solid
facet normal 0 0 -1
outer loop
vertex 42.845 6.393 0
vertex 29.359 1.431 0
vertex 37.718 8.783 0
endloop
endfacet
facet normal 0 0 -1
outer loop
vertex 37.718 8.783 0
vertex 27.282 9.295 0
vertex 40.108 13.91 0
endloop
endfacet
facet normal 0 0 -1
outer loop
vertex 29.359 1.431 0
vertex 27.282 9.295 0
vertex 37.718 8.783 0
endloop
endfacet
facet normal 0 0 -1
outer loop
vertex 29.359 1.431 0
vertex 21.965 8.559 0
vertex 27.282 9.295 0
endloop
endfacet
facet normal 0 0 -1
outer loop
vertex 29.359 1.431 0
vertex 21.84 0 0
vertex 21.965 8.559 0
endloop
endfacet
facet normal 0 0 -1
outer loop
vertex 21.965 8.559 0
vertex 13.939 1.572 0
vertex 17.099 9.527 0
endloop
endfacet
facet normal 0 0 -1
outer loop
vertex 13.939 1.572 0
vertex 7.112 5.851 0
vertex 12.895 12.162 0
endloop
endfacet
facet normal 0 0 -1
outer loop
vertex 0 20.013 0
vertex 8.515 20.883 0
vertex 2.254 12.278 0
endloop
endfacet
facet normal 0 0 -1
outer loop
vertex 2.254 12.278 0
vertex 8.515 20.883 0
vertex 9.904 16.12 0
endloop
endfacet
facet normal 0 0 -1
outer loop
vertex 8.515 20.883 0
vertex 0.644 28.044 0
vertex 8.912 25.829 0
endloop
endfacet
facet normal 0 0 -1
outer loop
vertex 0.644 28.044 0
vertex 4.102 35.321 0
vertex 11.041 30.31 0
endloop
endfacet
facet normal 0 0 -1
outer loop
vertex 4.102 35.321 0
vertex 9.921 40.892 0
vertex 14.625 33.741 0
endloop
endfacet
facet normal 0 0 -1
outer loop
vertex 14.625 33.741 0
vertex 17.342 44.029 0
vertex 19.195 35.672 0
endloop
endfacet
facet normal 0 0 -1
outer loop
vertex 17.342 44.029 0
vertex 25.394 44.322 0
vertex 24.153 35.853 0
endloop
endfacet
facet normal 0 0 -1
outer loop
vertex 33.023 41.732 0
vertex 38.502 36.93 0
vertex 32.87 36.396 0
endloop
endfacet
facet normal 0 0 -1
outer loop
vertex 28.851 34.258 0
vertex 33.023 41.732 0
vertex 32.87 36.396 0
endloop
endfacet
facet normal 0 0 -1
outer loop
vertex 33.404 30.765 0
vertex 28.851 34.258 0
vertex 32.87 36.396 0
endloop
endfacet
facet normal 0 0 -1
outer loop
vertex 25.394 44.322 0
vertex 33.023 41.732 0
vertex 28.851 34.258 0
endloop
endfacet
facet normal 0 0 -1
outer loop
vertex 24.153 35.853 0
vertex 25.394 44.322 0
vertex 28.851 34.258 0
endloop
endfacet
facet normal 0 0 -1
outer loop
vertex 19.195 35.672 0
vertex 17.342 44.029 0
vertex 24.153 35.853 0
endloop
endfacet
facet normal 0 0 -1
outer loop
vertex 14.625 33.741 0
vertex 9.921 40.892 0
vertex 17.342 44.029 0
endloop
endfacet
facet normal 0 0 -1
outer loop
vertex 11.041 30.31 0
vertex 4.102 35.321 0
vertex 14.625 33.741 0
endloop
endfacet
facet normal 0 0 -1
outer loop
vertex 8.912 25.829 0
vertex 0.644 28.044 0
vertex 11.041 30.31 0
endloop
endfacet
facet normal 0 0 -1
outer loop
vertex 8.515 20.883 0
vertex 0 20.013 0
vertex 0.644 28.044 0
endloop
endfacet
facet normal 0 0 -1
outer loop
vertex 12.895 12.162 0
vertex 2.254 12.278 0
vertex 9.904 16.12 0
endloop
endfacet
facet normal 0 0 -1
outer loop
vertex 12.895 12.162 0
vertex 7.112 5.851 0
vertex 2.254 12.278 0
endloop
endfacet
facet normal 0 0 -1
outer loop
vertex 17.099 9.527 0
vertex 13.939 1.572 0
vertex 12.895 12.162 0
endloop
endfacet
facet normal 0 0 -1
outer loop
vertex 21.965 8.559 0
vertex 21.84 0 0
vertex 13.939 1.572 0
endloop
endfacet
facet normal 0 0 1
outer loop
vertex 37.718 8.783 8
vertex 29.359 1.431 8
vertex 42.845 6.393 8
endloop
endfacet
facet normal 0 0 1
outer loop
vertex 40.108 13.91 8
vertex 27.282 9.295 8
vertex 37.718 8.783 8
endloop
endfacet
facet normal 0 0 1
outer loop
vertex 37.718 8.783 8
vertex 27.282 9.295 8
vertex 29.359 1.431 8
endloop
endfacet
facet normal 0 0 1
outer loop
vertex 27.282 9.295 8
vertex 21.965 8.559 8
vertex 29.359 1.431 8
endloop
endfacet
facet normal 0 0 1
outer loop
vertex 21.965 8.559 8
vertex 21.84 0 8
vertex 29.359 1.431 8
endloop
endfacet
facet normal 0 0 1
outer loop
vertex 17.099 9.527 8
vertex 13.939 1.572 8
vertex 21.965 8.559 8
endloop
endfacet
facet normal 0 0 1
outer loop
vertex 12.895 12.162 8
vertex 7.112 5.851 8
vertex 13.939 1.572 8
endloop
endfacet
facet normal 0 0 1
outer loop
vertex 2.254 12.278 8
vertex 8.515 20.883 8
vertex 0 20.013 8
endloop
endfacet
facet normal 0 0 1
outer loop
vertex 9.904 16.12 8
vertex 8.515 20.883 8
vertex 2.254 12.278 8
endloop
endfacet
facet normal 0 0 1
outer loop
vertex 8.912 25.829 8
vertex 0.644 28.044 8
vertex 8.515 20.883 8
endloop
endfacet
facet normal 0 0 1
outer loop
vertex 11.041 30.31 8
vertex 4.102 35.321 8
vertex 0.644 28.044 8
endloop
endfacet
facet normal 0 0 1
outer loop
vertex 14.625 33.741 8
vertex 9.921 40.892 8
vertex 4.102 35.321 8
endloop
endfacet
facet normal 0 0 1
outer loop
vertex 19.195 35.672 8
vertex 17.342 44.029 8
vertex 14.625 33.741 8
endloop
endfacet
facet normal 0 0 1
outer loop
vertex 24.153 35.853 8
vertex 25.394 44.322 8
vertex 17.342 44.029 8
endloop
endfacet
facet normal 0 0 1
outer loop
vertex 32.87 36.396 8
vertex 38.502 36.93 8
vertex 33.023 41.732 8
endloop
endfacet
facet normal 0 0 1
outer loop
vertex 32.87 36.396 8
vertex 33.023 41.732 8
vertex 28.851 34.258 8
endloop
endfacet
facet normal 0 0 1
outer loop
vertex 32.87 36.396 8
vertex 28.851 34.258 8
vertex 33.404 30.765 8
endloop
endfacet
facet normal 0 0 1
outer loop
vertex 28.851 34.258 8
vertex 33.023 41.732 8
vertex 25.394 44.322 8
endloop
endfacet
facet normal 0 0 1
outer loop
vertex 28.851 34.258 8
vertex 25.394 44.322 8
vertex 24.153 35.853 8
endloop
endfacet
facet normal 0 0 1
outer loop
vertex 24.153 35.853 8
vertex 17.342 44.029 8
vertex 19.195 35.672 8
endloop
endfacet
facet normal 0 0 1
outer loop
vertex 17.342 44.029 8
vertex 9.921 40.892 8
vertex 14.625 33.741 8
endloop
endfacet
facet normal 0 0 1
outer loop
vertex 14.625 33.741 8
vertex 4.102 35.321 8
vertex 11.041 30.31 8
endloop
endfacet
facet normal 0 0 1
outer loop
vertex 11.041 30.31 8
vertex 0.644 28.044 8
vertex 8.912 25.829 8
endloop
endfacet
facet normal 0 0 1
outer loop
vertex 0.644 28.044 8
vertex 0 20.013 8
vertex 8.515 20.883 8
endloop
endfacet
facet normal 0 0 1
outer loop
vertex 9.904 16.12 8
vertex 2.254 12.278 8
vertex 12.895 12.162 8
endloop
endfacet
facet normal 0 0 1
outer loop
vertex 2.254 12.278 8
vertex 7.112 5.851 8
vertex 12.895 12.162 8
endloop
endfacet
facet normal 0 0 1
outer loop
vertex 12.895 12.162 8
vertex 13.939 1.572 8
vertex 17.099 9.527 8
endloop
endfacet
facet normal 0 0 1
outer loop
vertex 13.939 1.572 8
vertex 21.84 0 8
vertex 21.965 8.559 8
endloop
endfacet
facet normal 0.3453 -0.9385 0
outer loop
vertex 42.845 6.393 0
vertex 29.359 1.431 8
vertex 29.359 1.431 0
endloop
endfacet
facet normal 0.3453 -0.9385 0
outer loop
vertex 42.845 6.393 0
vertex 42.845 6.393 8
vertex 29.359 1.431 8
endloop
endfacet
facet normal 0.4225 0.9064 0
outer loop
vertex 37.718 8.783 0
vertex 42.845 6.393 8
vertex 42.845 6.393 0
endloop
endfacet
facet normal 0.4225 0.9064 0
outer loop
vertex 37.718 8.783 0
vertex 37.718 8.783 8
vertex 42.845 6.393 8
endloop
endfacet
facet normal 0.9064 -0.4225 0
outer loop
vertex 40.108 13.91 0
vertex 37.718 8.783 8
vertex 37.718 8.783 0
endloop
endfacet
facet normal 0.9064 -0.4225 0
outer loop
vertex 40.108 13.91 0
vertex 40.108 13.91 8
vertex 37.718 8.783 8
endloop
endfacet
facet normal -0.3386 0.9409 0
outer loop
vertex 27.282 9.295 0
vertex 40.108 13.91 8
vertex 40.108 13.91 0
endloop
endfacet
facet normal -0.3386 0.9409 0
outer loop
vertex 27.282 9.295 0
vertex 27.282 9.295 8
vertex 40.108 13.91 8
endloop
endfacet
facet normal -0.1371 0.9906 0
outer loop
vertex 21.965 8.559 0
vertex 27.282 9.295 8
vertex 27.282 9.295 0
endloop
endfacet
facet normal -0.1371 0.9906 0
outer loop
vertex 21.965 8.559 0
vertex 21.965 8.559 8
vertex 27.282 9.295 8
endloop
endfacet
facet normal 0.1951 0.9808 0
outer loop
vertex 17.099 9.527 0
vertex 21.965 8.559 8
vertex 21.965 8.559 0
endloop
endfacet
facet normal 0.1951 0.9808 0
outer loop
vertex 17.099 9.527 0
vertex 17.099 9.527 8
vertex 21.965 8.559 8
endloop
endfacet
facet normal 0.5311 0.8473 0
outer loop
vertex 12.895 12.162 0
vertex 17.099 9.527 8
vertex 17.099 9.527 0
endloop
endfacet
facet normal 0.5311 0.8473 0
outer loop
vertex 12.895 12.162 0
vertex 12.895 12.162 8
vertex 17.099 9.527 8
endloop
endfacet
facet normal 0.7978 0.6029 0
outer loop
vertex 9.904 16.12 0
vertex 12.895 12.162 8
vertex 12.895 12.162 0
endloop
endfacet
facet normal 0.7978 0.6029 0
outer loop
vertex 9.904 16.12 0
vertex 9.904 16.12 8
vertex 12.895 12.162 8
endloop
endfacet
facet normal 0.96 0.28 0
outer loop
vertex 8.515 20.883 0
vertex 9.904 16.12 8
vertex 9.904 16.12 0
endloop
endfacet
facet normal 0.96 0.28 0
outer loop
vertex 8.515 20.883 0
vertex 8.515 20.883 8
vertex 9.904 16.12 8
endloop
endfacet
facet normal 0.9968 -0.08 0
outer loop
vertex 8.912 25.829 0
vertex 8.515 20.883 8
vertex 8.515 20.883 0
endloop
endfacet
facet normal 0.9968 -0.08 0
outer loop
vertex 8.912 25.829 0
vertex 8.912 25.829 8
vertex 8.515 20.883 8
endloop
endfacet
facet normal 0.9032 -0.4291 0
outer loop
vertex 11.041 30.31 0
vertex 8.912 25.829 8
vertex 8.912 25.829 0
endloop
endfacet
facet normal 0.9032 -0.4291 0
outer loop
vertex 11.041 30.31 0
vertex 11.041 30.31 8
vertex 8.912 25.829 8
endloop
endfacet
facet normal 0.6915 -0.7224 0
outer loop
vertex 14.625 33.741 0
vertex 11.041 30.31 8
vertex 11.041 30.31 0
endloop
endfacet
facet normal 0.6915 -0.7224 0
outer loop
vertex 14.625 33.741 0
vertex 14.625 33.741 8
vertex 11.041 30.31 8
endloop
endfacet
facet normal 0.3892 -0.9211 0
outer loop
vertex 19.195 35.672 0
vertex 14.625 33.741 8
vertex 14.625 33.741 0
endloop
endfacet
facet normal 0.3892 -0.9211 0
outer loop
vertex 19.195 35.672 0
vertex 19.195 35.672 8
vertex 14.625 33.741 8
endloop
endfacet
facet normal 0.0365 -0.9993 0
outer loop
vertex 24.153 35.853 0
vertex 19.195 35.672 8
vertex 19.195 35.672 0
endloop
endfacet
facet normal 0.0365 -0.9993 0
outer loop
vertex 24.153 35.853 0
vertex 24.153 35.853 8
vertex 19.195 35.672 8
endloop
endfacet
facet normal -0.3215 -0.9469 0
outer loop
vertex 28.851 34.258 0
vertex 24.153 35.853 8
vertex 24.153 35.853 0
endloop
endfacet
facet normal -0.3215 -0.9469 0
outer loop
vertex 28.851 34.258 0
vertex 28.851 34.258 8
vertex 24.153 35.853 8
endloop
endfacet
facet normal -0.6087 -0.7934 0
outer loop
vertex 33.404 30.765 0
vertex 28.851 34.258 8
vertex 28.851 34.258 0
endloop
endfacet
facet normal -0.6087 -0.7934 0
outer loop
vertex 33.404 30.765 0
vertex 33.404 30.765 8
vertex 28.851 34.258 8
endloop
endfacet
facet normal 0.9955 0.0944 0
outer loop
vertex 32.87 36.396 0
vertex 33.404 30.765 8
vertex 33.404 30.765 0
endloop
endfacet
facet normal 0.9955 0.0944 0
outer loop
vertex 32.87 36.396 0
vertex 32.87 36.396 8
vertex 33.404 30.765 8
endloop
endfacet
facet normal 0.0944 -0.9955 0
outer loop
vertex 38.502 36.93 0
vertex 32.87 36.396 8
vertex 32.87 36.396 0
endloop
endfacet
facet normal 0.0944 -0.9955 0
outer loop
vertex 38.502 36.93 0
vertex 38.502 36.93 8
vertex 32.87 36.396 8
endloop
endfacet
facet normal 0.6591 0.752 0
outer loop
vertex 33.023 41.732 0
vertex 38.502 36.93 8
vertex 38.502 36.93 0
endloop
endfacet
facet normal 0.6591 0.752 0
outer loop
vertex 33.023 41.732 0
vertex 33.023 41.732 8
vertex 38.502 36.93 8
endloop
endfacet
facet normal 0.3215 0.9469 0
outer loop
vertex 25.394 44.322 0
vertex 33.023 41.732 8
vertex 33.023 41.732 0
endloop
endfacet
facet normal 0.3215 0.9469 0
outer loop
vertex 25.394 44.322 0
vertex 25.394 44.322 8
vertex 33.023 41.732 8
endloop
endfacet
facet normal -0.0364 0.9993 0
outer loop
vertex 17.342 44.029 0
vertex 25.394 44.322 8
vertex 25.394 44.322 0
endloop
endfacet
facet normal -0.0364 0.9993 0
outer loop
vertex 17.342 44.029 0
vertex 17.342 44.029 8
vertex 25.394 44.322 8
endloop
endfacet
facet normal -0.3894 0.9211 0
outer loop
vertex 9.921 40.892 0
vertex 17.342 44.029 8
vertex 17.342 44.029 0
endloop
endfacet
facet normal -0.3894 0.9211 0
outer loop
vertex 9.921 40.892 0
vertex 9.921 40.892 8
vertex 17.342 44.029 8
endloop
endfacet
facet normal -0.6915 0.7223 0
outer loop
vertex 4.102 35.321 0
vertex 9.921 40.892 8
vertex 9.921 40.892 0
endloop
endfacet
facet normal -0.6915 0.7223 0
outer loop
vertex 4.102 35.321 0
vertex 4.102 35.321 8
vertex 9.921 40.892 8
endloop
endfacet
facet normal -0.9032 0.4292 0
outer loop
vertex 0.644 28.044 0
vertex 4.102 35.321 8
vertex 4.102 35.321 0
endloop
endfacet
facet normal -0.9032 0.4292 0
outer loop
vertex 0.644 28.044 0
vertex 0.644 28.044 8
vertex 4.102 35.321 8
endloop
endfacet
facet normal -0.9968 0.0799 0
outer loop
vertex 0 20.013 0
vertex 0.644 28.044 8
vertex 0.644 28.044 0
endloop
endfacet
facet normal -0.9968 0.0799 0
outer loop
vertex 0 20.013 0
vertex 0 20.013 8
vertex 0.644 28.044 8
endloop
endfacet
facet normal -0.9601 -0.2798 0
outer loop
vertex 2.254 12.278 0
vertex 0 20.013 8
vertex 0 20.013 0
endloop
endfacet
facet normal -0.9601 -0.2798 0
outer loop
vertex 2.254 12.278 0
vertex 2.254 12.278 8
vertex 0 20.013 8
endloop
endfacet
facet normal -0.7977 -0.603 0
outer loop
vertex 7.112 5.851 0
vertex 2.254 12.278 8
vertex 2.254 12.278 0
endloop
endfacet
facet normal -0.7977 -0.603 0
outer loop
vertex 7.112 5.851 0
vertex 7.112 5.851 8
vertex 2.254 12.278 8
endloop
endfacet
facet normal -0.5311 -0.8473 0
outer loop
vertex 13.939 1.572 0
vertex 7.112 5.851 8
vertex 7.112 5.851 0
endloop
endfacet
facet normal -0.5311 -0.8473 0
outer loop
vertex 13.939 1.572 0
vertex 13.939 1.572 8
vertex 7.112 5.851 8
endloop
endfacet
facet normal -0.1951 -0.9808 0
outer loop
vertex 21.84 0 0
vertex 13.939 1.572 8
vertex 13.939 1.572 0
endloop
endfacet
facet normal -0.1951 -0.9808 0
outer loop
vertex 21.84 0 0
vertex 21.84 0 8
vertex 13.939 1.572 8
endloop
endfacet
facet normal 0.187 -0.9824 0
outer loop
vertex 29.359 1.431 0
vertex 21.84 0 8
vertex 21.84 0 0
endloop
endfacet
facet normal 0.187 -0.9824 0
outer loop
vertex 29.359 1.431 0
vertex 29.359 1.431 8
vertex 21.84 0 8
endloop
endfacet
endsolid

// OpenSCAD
$fn = 32;

// ----------------------------------------------------------------------
// Eye lug: ring_tail, 8 mm thick
// ----------------------------------------------------------------------

// --- parameters (mm) ---
profile_height = 8;       // extrusion height
profile_points = 30;      // points of the closed outline

profile = [[32.87, 36.396], [38.502, 36.93], [33.023, 41.732], [25.394, 44.322], [17.342, 44.029], [9.921, 40.892], [4.102, 35.321], [0.644, 28.044], [0, 20.013], [2.254, 12.278], [7.112, 5.851], [13.939, 1.572], [21.84, 0], [29.359, 1.431], [42.845, 6.393], [37.718, 8.783], [40.108, 13.91], [27.282, 9.295], [21.965, 8.559], [17.099, 9.527], [12.895, 12.162], [9.904, 16.12], [8.515, 20.883], [8.912, 25.829], [11.041, 30.31], [14.625, 33.741], [19.195, 35.672], [24.153, 35.853], [28.851, 34.258], [33.404, 30.765]];  // single closed polygon, 30 points, counter clockwise

// --- the one profile operation ---
linear_extrude(height = profile_height) polygon(points = profile);
